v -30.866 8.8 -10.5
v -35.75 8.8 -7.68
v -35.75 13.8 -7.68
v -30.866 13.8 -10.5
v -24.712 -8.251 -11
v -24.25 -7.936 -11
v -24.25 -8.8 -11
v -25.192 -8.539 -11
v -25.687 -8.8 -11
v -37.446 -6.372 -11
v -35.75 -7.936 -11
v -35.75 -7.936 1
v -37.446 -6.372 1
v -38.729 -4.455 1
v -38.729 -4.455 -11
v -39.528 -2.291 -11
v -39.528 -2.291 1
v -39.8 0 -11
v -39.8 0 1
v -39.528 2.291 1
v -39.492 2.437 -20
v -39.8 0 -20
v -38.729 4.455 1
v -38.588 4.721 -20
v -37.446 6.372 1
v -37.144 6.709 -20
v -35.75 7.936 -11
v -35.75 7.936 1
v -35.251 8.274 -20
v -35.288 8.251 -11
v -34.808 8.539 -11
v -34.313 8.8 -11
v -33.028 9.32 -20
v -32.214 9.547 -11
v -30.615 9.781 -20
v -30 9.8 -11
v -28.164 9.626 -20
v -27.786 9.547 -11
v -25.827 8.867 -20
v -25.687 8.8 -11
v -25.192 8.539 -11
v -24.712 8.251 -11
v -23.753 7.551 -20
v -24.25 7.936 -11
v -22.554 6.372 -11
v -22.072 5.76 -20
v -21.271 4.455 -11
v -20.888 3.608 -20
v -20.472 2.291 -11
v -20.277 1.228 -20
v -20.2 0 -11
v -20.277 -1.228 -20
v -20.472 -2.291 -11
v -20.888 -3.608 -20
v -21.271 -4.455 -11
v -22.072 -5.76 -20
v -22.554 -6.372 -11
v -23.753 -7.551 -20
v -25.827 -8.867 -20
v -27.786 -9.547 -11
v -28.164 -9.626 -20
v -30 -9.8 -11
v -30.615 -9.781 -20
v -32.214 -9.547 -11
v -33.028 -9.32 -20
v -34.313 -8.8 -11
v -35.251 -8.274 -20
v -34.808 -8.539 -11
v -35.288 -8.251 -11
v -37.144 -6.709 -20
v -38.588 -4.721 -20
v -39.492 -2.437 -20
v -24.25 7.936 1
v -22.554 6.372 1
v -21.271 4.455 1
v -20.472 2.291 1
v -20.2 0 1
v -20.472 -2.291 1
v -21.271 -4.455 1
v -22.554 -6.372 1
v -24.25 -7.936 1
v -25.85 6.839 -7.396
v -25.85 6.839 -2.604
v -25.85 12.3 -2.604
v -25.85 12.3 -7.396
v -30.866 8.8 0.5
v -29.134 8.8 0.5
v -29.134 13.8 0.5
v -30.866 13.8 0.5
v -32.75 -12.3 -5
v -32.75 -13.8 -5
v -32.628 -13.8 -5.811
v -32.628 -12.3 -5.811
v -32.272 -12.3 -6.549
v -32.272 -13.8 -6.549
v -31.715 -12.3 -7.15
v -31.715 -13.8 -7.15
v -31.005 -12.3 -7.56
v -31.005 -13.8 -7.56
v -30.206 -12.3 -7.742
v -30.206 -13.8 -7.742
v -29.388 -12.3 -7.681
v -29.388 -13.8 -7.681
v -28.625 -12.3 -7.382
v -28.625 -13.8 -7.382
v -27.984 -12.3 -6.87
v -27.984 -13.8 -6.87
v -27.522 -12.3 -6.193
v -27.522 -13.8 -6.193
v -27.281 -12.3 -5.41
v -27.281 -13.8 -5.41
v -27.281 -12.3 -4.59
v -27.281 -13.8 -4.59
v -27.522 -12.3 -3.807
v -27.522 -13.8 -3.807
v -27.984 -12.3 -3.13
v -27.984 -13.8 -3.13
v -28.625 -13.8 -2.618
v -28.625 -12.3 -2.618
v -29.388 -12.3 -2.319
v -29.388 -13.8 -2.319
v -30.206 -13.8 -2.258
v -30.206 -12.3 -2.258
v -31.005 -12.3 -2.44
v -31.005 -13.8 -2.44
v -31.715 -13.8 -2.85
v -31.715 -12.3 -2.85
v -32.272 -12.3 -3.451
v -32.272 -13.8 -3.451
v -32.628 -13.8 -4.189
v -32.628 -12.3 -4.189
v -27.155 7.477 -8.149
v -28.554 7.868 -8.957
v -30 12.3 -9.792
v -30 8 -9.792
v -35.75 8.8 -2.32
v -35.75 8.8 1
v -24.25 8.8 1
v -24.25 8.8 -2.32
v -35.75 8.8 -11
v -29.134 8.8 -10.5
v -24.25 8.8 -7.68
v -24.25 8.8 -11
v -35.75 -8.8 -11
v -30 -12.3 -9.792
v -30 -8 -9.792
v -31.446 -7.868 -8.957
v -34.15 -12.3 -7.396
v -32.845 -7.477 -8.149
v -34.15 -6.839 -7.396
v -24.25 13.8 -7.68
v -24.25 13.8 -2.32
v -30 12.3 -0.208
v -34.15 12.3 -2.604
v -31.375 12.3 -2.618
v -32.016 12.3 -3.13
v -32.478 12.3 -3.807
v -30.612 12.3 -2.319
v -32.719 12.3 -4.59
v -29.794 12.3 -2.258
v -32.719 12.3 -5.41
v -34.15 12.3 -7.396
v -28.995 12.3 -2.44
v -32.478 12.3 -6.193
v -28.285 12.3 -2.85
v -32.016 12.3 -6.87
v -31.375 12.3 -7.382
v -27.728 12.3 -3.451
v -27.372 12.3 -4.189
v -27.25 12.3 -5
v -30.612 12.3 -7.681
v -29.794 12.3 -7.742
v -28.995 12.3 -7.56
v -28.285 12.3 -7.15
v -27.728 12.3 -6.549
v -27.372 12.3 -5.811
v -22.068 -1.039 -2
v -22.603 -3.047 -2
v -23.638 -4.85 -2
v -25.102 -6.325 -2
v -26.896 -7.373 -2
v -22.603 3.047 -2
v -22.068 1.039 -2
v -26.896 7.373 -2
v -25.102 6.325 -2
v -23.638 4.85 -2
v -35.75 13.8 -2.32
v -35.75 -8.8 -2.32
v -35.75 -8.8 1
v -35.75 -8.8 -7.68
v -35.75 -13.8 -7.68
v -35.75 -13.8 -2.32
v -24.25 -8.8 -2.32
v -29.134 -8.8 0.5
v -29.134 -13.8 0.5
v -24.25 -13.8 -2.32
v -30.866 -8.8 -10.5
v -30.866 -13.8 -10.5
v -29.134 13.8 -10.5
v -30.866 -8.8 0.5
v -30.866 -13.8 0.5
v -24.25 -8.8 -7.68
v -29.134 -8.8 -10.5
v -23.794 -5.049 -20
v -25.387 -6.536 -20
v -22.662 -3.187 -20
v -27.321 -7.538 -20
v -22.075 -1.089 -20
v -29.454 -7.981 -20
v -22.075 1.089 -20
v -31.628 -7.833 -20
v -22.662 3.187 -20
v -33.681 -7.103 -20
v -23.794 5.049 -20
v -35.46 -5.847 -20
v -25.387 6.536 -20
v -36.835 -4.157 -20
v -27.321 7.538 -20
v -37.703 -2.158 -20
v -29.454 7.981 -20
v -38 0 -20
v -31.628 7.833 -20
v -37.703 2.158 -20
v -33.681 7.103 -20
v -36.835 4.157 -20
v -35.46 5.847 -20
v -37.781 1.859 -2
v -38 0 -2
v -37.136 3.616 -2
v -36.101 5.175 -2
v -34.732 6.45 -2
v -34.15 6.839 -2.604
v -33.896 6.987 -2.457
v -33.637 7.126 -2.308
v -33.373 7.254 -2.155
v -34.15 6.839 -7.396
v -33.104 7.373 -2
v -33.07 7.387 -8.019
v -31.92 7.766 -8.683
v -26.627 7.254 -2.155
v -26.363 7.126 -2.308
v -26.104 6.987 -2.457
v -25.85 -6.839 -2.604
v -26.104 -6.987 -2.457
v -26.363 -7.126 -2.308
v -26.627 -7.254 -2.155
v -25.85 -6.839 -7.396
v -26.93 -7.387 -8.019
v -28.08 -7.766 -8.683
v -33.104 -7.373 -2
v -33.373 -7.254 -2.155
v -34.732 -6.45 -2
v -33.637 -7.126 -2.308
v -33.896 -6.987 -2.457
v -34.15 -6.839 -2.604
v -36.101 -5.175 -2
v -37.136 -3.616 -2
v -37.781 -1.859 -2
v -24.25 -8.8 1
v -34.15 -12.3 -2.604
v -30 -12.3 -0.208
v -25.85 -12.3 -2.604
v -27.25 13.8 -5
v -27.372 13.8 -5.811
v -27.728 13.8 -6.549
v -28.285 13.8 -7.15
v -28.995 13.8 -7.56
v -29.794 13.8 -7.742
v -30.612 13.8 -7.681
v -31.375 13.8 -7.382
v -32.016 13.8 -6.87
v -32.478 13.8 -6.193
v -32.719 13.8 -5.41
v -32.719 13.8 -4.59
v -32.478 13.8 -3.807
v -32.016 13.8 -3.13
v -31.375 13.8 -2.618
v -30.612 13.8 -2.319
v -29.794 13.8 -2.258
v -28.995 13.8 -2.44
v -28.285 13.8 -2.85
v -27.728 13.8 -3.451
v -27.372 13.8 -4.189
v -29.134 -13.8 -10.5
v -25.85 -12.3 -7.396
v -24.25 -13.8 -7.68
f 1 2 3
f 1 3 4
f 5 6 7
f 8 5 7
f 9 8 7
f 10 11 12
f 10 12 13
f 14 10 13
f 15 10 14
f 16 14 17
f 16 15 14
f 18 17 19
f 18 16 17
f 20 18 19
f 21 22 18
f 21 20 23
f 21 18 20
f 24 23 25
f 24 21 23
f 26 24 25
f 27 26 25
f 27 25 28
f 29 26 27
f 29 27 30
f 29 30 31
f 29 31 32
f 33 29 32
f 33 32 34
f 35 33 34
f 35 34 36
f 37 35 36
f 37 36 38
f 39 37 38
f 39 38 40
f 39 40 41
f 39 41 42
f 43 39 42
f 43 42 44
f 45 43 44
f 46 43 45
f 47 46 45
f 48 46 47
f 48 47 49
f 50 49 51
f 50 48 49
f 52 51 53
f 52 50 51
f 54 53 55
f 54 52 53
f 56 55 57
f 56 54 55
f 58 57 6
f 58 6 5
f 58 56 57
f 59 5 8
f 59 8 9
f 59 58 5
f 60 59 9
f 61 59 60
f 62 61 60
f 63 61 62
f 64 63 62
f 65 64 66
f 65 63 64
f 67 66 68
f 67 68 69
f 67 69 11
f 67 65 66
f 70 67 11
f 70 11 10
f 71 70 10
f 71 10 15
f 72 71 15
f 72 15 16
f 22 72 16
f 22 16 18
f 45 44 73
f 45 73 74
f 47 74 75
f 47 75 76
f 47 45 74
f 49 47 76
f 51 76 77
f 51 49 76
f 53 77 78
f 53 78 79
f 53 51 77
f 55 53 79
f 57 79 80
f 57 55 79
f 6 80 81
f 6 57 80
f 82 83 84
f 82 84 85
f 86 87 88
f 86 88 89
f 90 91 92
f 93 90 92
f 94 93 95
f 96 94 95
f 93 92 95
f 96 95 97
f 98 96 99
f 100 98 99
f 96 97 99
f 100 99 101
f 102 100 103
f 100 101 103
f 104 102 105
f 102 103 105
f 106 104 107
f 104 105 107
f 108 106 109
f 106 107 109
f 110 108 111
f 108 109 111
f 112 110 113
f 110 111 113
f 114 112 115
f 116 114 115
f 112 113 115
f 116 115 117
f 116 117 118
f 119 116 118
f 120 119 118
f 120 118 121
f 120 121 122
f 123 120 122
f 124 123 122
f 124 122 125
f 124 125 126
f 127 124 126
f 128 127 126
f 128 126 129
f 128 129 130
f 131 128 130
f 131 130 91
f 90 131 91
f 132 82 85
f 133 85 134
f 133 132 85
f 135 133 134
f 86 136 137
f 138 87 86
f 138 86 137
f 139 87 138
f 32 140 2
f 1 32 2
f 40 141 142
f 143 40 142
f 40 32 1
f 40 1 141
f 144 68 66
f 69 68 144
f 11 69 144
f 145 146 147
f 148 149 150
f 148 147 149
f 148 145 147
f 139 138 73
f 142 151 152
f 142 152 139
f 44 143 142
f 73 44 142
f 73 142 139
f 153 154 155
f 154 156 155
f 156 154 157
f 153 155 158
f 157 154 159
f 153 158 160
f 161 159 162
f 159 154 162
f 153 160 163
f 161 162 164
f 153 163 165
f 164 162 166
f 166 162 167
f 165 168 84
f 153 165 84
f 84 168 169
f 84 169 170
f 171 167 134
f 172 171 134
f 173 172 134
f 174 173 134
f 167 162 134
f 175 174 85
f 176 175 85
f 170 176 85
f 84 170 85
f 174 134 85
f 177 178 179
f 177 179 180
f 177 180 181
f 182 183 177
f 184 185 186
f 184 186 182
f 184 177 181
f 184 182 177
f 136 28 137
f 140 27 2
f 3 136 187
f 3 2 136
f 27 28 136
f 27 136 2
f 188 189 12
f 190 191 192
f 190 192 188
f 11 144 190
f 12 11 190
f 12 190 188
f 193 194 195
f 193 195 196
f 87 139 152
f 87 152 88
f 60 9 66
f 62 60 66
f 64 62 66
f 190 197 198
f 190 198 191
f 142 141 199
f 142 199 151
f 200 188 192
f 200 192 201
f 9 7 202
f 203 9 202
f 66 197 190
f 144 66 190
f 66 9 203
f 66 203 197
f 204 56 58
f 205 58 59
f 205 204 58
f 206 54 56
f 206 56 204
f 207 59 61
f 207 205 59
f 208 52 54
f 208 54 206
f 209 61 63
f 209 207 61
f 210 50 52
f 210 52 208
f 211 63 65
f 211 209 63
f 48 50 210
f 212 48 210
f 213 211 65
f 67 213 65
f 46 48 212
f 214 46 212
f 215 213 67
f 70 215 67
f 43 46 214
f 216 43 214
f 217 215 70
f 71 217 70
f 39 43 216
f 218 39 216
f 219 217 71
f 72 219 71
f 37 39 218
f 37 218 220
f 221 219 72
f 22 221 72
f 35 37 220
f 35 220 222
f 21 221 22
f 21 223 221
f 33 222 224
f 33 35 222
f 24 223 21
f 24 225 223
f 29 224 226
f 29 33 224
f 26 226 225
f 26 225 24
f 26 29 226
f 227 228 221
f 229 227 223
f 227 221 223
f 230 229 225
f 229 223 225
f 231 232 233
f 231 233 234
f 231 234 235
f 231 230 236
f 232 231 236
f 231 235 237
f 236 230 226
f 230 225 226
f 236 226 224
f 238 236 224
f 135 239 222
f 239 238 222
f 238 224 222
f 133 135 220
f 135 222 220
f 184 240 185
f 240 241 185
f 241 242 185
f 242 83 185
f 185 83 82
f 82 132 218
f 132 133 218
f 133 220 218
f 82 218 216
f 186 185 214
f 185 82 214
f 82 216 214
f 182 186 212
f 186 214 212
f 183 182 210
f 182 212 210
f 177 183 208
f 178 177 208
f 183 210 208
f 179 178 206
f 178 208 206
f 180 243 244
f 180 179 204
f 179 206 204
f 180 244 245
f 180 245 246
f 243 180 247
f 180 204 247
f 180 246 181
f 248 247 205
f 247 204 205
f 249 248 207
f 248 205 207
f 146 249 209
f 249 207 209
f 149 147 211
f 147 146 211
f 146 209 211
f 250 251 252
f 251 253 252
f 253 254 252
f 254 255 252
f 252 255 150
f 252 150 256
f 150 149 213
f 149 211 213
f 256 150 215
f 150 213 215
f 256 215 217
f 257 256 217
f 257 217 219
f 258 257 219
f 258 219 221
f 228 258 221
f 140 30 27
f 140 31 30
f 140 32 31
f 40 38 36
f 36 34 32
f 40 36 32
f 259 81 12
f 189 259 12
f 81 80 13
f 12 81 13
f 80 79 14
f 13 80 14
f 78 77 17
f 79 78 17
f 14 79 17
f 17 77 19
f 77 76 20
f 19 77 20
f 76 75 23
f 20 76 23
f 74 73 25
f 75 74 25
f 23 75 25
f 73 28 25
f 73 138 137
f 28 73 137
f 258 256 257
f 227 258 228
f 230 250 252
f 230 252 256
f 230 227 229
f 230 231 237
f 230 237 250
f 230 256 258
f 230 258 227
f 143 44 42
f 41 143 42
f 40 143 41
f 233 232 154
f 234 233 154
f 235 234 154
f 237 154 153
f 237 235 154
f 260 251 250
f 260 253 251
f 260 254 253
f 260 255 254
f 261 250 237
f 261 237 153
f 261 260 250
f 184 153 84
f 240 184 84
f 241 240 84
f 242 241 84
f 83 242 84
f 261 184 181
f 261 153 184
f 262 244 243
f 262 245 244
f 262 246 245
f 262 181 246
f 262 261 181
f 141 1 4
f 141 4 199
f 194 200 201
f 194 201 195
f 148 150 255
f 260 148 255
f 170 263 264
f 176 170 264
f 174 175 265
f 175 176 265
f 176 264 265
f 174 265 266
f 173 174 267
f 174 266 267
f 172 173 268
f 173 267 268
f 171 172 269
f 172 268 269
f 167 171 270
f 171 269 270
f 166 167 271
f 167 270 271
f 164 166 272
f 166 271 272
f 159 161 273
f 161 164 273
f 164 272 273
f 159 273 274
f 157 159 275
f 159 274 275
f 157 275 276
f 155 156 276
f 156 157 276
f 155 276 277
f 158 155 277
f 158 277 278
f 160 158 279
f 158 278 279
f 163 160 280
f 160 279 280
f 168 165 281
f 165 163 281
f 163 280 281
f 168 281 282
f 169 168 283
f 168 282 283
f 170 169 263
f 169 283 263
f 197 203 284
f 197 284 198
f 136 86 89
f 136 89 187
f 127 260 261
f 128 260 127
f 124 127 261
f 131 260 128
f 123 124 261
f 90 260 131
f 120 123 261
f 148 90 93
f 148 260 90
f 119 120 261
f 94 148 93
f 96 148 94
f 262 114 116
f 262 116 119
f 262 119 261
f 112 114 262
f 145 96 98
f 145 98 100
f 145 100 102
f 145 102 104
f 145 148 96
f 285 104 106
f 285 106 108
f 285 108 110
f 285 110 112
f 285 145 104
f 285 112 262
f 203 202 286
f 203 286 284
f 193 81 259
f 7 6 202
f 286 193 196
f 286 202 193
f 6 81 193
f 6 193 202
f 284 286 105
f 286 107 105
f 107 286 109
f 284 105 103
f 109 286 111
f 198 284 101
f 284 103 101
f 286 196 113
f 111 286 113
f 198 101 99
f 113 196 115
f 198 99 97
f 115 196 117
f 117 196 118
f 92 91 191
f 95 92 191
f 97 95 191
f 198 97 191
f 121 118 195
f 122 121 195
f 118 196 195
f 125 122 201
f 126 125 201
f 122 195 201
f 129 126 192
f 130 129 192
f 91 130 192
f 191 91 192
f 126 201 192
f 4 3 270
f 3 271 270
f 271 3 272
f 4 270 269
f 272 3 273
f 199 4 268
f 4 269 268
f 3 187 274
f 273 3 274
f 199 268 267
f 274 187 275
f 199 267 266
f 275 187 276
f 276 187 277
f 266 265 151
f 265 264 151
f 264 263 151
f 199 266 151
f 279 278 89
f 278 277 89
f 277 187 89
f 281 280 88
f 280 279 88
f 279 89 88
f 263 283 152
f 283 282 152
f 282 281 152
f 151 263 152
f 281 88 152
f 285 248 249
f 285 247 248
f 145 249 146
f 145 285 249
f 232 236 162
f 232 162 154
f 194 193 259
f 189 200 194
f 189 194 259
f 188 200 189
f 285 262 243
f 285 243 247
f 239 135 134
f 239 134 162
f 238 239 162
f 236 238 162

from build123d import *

# Parameters (mm, degrees)
BOSS_EXTRUDE1_DEPTH            = 12
BOSS_EXTRUDE2_DEPTH            = 5
BOSS_EXTRUDE3_DEPTH            = 5
BOSS_EXTRUDE4_START            = 9
SKETCH4_R                      = 9.8
BOSS_EXTRUDE4_DEPTH            = 9
CUT_THICKEN1_START             = -12.3
CUT_THICKEN1_DEPTH             = 24.6
SKETCH5_W                      = 8
SKETCH5_H                      = 18
F_5_5_5_5_DIAMETER_HOLE1_D     = 5.5
F_5_5_5_5_DIAMETER_HOLE1_DEPTH = 1.5
F_5_5_5_5_DIAMETER_HOLE2_D     = 5.5


# Read off the part's stored shape, not the designer's step: Cut-Thicken1
with BuildPart() as part:
    # Sketch1 → Boss-Extrude1 (new body)
    with BuildSketch(Plane(origin=(0, 0, -11), x_dir=(-1, 0, 0), z_dir=(0, 0, -1))):
        with BuildLine():
            Line((24.25, -7.93583644), (24.25, -8.8))
            Line((24.25, -8.8), (35.75, -8.8))
            Line((35.75, -8.8), (35.75, -7.93583644))
            ThreePointArc((35.75, -7.93583644), (39.8, 0), (35.75, 7.93583644))
            Line((35.75, 7.93583644), (35.75, 8.8))
            Line((35.75, 8.8), (24.25, 8.8))
            Line((24.25, 8.8), (24.25, 7.93583644))
            ThreePointArc((24.25, 7.93583644), (20.2, 0), (24.25, -7.93583644))
        make_face()
    extrude(amount=-BOSS_EXTRUDE1_DEPTH)

    # Sketch2 → Boss-Extrude2 (add)
    with BuildSketch(Plane(origin=(0, 8.8, 0), x_dir=(-1, 0, 0), z_dir=(0, 1, 0))):
        Polygon((29.133974596, 0.5), (30.866025404, 0.5), (35.75, -2.319764048), (35.75, -7.680235952), (30.866025404, -10.5), (29.133974596, -10.5), (24.25, -7.680235952), (24.25, -2.319764048), align=None)
    extrude(amount=BOSS_EXTRUDE2_DEPTH)

    # Sketch3 → Boss-Extrude3 (add)
    with BuildSketch(Plane.XZ.offset(8.8)):
        Polygon((-35.75, -2.319764048), (-30.866025404, 0.5), (-29.133974596, 0.5), (-24.25, -2.319764048), (-24.25, -7.680235952), (-29.133974596, -10.5), (-30.866025404, -10.5), (-35.75, -7.680235952), align=None)
    extrude(amount=BOSS_EXTRUDE3_DEPTH)

    # Sketch4 → Boss-Extrude4 (add)
    with BuildSketch(Plane(origin=(0, 0, -11), x_dir=(-1, 0, 0), z_dir=(0, 0, -1)).offset(BOSS_EXTRUDE4_START)):
        with Locations((30, 0)):
            Circle(SKETCH4_R)
    extrude(amount=-BOSS_EXTRUDE4_DEPTH)

    # Cut-Thicken1 outline → Cut-Thicken1 (cut)
    with BuildSketch(Plane(origin=(0, 0, 0), x_dir=(1, 0, 0), z_dir=(0, 1, 0)).offset(CUT_THICKEN1_START)):
        Polygon((-30, 9.792007234), (-34.15, 7.396003617), (-34.15, 2.603996383), (-30, 0.207992766), (-25.85, 2.603996383), (-25.85, 7.396003617), align=None)
    extrude(amount=CUT_THICKEN1_DEPTH, mode=Mode.SUBTRACT)

    # Sketch5 → Cut-Revolve1 (revolve, cut)
    with BuildSketch(Plane(origin=(0, 0, 0), x_dir=(1, 0, 0), z_dir=(0, 1, 0))):
        with Locations((-34, 11)):
            Rectangle(SKETCH5_W, SKETCH5_H)
    revolve(axis=Axis((-30, 0, -2), (0, 0, -1)), mode=Mode.SUBTRACT)

    # Ø5.5 (5.5) Diameter Hole1
    with Locations(Plane(origin=(0, 12.3, 0), x_dir=(-1, 0, 0), z_dir=(0, -1, 0))):
        with Locations((30, 5)):
            Hole(F_5_5_5_5_DIAMETER_HOLE1_D / 2, depth=F_5_5_5_5_DIAMETER_HOLE1_DEPTH)

    # Ø5.5 (5.5) Diameter Hole2 (through all)
    with Locations(Plane(origin=(0, -12.3, 0), x_dir=(1, 0, 0), z_dir=(0, 1, 0))):
        with Locations((-30, 5)):
            Hole(F_5_5_5_5_DIAMETER_HOLE2_D / 2)


solid = part.part
